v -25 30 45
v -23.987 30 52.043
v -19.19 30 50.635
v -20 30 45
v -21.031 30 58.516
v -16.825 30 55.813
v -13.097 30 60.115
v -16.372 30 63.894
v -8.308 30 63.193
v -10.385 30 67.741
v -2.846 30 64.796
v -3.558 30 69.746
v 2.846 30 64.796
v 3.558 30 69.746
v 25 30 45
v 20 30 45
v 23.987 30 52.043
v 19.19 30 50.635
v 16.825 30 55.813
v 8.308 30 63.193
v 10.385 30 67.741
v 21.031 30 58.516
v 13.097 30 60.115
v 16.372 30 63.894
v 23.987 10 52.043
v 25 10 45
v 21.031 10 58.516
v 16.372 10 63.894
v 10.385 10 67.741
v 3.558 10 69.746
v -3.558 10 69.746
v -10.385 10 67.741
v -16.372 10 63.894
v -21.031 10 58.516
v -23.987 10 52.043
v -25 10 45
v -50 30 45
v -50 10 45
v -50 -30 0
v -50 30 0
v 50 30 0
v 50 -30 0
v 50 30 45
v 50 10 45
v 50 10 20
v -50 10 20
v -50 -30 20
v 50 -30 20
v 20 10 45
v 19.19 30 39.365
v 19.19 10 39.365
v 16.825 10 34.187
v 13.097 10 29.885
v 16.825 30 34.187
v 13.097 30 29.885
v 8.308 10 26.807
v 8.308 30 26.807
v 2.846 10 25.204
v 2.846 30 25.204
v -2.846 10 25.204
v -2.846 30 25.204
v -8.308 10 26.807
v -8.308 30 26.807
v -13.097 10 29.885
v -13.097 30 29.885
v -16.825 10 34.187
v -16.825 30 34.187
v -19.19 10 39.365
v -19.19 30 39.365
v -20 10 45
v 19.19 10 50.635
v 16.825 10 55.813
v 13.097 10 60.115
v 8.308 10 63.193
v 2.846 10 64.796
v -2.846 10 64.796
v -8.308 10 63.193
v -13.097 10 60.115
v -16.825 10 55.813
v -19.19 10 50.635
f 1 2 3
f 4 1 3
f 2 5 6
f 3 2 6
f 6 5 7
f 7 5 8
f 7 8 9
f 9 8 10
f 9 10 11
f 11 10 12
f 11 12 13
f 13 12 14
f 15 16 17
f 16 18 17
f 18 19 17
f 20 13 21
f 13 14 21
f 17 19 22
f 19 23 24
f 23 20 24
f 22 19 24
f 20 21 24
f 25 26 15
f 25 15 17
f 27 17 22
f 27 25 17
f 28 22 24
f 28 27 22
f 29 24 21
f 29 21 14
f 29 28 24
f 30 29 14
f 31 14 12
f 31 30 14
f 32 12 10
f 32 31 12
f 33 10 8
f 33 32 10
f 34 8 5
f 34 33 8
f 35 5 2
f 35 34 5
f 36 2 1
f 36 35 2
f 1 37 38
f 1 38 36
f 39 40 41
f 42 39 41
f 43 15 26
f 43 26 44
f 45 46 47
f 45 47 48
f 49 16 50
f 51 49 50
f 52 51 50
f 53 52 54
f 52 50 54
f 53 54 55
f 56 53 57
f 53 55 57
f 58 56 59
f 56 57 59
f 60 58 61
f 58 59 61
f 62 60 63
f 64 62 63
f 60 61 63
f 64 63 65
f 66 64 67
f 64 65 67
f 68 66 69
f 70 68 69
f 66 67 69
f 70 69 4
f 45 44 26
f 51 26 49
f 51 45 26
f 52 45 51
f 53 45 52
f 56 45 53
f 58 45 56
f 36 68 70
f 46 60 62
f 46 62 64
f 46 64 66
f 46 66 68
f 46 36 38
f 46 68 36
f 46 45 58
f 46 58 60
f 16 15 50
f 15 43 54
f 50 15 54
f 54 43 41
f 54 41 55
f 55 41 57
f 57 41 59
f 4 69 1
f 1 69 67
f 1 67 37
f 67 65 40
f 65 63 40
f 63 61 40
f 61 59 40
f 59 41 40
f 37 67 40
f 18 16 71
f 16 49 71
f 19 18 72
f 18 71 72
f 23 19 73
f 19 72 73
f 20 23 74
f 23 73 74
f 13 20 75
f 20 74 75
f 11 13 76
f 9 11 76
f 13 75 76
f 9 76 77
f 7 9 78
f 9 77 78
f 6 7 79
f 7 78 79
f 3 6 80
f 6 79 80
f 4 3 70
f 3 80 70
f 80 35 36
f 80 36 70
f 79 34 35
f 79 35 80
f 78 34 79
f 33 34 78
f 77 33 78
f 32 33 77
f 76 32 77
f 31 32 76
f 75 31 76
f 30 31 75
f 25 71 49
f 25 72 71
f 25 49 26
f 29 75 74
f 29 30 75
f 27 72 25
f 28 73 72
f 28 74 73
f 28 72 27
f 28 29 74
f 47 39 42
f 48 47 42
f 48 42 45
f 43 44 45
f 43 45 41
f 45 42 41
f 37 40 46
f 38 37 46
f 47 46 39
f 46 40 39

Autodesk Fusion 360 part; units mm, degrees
sketch "Sketch1" plane through (0, 0, 0) normal (0, 0, 1) x (1, 0, 0)
  line L0 (50, 30) -> (-50, 30)
  line L1 (-50, 30) -> (-50, -30)
  line L2 (-50, -30) -> (50, -30)
  line L3 (50, -30) -> (50, 30)
  line L4 (50, 30) -> (-50, -30) construction
  line L5 (-50, 30) -> (50, -30) construction
  line L6 (-50, 30) -> (-25, 30)
  line L7 (-25, 30) -> (-25, 10)
  line L8 (-25, 10) -> (-50, 10)
  line L9 (-50, 10) -> (-50, 30)
  line L10 (-25, 30) -> (25, 30)
  line L11 (25, 30) -> (25, 10)
  line L12 (25, 10) -> (-25, 10)
  line L13 (-25, 10) -> (-25, 30)
  line L14 (25, 30) -> (50, 30)
  line L15 (50, 30) -> (50, 10)
  line L16 (50, 10) -> (25, 10)
  line L17 (25, 10) -> (25, 30)
  dimension "d1" = 100
  dimension "d2" = 60
  dimension "d3" = 25
  dimension "d4" = 50
  dimension "d5" = 20
extrude "Extrude1" add sketch "Sketch1" along normal blind 20 contours L1 L2 L3 L8 L12 L16
extrude "Extrude2" add sketch "Sketch1" along normal blind 45 contours L0 L3 L11 L14 L15 L16 L17 | L0 L7 L10 L11 L12 L13 L17 | L0 L1 L6 L7 L8 L9 L13
sketch "Sketch2" plane through (0, 0, 0) normal (0, 1, 0) x (1, 0, 0)
sketch "Sketch3" plane through (0, 10, 0) normal (0, -1, 0) x (1, 0, 0)
  line L0 (-50, 20) -> (50, 20)
  line L1 (50, 20) -> (50, 45)
  line L2 (-50, 45) -> (-50, 20)
  circle A0 centre (0, 45) radius 20
  arc A1 (25, 45) -> (-25, 45) centre (0, 45) ccw
  line L3 (-25, 45) -> (-20, 45)
  line L4 (20, 45) -> (25, 45)
  dimension "d10" = 40
hole "Hole1" at (0, 10, 45) direction (0, 1, 0) diameter 40 depth 40 tip angle 118
extrude "Extrude3" add sketch "Sketch3" against normal blind 20 contours A0 A1 L3 L4
sketch "Sketch4" plane through (50, 0, 0) normal (1, 0, 0) x (0, 1, 0)
  line L0 (-30, 0) -> (30, 0)
  line L1 (30, 0) -> (30, 45)
  line L2 (30, 45) -> (10, 45)
  line L3 (10, 45) -> (10, 20)
  line L4 (10, 20) -> (-30, 20)
  line L5 (-30, 20) -> (-30, 0)
